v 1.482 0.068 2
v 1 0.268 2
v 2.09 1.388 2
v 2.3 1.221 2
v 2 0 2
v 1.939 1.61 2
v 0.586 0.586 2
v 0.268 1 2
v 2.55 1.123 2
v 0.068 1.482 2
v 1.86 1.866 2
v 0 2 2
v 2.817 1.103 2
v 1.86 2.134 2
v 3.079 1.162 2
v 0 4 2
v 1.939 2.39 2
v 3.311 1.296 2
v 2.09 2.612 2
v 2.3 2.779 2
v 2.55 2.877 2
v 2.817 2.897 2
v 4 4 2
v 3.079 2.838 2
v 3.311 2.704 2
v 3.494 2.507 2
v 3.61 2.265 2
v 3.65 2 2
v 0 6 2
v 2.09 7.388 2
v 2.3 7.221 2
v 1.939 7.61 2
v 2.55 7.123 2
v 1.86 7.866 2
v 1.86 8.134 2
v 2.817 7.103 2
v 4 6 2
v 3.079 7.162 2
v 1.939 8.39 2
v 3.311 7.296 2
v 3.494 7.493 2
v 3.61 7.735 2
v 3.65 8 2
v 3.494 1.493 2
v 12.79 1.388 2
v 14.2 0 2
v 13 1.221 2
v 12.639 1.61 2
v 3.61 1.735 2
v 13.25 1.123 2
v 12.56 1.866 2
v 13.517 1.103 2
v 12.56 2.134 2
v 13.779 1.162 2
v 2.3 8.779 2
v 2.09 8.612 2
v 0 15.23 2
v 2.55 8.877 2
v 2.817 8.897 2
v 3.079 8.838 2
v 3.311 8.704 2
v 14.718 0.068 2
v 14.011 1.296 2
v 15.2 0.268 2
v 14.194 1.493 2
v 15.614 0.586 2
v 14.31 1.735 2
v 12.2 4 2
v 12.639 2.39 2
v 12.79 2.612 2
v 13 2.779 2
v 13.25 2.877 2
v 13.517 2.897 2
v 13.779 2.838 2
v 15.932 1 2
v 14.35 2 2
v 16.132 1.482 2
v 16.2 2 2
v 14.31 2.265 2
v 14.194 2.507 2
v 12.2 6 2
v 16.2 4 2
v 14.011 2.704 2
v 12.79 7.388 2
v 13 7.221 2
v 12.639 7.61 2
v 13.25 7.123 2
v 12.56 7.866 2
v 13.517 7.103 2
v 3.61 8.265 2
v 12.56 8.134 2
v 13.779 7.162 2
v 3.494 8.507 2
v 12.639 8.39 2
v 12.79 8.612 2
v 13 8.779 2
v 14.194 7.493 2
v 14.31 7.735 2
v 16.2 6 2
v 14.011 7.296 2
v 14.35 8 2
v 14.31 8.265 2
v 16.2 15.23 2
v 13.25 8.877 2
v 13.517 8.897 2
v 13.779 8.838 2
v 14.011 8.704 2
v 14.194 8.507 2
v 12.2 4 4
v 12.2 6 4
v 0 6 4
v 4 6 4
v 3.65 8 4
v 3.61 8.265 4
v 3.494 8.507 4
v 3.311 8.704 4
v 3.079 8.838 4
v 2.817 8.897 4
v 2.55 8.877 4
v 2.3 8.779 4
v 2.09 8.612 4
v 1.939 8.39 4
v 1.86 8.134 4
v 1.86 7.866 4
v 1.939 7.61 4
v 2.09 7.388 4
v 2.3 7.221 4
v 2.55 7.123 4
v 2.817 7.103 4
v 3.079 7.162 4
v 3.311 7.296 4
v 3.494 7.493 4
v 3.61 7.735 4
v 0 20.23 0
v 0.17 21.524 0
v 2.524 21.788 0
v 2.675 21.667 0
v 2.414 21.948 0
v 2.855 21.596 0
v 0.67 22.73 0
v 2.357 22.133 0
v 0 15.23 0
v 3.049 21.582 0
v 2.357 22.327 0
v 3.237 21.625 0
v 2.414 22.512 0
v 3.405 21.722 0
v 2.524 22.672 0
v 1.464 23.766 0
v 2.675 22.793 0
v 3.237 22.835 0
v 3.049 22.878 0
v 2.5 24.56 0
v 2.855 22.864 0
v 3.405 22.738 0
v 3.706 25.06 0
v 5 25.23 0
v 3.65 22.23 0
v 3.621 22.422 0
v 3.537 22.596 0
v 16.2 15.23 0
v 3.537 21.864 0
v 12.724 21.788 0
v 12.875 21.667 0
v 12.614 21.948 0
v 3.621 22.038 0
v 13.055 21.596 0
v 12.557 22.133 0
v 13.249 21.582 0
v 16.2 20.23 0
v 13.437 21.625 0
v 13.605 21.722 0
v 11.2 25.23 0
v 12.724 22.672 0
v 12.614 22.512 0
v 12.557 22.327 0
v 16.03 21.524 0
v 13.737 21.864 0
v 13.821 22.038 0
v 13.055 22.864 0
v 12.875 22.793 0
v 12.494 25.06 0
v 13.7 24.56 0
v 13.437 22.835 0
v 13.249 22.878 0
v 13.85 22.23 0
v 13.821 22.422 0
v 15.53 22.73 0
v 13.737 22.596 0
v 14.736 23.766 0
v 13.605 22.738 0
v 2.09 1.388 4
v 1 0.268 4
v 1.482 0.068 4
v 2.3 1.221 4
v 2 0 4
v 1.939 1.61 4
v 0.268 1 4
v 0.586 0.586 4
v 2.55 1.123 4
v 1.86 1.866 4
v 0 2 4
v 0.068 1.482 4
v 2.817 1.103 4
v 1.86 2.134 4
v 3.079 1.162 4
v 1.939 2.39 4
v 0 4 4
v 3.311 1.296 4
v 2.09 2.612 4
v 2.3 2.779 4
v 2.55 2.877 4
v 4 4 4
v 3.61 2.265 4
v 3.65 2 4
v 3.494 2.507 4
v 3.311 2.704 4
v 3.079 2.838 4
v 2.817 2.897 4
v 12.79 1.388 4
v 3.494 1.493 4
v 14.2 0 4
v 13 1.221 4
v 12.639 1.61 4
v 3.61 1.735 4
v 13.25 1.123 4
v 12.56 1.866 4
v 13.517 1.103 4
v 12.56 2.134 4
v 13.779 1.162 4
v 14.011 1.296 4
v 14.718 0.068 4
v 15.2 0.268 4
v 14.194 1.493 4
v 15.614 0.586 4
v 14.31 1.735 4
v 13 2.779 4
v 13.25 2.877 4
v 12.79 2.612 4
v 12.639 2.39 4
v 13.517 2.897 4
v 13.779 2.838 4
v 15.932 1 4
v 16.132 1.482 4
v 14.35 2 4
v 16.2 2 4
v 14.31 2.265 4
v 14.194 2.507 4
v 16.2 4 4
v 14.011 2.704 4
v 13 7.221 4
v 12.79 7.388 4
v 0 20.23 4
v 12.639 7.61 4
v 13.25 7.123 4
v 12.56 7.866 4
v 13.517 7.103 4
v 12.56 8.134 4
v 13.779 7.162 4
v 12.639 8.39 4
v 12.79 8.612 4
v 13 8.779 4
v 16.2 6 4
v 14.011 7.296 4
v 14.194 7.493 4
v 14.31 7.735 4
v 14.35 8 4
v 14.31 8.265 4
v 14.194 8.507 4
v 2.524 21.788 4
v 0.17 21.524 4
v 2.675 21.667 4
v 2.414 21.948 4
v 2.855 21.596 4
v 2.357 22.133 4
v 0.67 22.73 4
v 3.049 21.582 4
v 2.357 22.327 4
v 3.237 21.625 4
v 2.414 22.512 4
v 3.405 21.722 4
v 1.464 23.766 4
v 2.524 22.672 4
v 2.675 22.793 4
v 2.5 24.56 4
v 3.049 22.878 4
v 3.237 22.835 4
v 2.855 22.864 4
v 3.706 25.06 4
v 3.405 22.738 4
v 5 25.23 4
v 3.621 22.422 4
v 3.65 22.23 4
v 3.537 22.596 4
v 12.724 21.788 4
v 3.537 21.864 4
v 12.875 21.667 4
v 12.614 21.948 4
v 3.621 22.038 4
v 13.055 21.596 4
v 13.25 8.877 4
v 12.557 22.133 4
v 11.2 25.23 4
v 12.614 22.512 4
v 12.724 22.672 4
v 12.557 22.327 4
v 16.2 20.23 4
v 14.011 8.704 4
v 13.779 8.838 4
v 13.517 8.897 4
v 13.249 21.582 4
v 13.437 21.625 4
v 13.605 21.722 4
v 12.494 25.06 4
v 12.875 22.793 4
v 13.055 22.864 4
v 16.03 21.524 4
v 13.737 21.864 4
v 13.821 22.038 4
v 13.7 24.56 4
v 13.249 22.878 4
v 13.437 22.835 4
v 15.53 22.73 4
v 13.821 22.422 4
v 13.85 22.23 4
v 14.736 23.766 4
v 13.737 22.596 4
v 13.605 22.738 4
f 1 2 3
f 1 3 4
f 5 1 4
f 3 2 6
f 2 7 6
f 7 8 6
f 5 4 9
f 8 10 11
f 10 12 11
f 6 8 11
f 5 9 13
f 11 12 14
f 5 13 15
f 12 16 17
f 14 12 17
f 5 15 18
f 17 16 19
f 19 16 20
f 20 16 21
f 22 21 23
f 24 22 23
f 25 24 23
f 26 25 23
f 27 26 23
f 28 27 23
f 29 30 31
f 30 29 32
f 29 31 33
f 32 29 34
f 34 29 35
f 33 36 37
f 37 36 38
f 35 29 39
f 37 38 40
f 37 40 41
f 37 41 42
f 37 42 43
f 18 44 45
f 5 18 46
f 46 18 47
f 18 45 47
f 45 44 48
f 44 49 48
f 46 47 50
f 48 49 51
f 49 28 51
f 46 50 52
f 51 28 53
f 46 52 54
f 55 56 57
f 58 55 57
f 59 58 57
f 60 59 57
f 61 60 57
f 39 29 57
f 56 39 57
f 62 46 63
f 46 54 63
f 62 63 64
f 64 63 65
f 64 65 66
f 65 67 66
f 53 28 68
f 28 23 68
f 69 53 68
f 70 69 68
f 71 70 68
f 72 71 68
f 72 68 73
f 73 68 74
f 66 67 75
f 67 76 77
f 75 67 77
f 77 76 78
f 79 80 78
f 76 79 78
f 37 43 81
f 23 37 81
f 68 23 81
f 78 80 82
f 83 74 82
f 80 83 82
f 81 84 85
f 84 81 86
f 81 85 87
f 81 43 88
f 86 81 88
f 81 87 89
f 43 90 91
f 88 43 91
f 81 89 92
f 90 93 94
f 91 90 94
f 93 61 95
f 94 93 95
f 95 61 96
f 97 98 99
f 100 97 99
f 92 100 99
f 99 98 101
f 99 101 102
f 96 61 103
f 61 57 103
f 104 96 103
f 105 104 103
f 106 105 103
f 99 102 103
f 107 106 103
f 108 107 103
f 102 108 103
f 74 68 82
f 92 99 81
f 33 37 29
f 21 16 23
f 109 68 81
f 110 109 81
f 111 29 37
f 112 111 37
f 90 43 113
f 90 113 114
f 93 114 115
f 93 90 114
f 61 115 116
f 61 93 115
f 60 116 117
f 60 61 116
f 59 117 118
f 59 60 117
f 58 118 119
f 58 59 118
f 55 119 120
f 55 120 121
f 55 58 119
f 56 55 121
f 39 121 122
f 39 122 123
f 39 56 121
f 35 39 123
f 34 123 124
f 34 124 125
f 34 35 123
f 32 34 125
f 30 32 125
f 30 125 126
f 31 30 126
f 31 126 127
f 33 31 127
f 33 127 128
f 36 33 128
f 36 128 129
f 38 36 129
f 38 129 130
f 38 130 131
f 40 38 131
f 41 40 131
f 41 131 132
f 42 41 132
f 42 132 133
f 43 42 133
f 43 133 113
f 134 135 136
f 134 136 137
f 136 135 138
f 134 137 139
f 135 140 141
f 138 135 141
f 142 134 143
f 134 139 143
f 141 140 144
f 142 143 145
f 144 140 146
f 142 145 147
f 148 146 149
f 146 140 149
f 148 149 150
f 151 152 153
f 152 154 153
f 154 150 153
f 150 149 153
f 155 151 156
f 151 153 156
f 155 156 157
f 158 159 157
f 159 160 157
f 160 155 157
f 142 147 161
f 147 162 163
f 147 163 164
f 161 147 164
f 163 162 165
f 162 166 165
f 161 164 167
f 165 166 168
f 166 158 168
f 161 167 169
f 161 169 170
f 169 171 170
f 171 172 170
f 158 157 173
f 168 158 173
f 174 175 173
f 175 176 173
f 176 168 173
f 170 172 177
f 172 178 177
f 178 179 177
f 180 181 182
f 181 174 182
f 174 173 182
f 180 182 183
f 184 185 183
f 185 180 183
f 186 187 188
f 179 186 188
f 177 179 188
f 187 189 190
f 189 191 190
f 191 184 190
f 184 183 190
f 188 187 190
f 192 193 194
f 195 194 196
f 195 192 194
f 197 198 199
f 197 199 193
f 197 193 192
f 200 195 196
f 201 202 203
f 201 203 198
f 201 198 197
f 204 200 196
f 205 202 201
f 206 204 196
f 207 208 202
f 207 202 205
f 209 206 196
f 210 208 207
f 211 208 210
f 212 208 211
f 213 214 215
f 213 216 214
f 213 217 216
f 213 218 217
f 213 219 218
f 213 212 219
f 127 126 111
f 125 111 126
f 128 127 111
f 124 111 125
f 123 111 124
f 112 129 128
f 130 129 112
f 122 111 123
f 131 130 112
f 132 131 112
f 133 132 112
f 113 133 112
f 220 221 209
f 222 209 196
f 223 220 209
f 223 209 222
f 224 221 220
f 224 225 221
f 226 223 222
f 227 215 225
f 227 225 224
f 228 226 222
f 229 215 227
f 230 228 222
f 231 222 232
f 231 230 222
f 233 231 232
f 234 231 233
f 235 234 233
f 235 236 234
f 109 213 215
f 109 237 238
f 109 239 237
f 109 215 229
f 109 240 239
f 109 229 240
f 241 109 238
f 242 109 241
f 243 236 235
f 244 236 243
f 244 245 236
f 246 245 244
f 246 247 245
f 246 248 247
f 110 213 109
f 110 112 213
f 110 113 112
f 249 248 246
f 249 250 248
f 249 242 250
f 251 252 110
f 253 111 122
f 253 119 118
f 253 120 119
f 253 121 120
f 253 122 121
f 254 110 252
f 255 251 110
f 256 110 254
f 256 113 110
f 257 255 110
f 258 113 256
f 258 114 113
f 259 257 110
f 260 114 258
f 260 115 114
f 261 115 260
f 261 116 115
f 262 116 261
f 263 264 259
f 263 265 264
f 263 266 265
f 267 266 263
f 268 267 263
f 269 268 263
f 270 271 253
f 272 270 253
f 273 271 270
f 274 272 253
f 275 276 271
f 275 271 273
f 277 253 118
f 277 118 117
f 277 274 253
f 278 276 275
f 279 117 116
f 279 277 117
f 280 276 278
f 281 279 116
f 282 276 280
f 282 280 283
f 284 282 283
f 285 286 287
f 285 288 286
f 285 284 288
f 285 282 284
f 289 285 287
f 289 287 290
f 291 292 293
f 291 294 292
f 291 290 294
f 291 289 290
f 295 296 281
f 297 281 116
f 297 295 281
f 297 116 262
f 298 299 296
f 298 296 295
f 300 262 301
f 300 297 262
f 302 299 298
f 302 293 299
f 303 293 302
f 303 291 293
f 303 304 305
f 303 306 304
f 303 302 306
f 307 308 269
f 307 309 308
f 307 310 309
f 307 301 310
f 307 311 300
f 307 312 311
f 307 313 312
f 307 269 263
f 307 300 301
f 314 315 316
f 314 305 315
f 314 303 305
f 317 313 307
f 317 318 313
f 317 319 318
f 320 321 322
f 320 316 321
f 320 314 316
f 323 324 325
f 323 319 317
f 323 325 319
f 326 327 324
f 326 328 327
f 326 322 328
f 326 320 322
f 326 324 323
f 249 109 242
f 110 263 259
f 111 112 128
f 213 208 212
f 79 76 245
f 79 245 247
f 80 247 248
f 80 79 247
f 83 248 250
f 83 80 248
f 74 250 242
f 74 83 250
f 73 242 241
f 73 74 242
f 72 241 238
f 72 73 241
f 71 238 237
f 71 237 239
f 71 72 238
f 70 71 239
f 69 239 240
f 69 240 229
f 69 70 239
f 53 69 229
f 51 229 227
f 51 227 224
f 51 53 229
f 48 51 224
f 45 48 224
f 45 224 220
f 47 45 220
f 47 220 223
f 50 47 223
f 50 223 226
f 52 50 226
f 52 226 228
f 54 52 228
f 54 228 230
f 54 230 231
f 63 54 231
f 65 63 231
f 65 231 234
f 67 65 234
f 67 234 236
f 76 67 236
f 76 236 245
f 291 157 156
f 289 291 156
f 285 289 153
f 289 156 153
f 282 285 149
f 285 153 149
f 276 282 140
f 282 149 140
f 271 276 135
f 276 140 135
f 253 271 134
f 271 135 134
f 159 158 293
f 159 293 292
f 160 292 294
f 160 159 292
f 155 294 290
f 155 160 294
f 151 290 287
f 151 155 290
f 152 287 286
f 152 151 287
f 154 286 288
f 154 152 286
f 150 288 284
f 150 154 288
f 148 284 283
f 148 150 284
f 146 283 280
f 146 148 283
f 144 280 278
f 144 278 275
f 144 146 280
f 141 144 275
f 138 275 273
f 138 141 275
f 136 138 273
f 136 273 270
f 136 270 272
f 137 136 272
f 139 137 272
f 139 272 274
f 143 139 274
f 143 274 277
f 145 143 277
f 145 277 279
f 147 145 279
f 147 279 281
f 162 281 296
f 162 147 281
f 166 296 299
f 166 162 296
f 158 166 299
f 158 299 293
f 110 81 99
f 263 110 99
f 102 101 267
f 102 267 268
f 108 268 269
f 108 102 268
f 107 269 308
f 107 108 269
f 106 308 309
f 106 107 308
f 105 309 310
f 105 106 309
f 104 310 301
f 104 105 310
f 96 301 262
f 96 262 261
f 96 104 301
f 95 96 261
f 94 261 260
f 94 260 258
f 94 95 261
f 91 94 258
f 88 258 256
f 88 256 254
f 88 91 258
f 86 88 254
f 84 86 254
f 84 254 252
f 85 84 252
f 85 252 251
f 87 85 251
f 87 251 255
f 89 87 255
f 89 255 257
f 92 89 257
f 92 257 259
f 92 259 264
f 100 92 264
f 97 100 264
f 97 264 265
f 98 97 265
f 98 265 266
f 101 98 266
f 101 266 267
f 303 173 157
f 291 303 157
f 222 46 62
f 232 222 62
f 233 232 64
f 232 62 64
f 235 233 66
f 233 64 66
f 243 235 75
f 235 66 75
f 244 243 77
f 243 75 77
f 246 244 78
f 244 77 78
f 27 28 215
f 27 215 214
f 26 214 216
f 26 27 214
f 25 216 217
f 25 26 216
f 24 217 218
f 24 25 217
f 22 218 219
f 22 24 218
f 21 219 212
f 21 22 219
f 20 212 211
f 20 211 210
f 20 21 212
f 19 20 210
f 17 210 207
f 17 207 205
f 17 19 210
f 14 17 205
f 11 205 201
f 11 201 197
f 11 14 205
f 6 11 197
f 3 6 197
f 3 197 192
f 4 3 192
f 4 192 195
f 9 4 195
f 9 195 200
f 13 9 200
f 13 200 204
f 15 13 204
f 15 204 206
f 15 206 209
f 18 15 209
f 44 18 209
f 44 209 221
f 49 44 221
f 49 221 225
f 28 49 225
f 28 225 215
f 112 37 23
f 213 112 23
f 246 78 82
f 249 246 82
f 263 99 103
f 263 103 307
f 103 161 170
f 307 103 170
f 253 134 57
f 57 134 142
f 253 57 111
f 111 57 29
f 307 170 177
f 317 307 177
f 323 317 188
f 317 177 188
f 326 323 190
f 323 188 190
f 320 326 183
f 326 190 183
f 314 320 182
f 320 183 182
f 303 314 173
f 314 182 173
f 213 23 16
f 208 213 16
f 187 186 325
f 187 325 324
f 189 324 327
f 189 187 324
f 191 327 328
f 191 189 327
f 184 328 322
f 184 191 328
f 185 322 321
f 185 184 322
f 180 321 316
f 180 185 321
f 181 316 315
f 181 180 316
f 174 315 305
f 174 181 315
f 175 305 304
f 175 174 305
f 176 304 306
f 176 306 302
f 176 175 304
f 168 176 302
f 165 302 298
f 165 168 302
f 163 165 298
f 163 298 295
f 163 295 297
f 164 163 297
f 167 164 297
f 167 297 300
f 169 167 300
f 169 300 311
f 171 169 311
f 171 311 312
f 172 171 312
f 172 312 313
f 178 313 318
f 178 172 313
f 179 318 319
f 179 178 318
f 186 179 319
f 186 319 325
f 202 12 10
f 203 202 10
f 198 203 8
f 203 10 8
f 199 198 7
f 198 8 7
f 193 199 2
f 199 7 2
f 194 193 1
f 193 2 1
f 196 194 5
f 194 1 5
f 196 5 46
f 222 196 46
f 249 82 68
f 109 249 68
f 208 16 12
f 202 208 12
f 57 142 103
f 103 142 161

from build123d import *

# Parameters (mm, degrees)
SKETCH1_R           = 0.9
SKETCH1_R_2         = 0.65
BOSS_EXTRUDE1_DEPTH = 4
SKETCH2_W           = 16.2
SKETCH2_H           = 15.23
CUT_EXTRUDE1_DEPTH  = 2


with BuildPart() as part:
    # Sketch1 → Boss-Extrude1 (new body)
    with BuildSketch(Plane.XY):
        with BuildLine():
            Line((2, 0), (14.2, 0))
            ThreePointArc((14.2, 0), (15.614213562, 0.585786438), (16.2, 2))
            Line((16.2, 2), (16.2, 4))
            Line((16.2, 4), (12.2, 4))
            Line((12.2, 4), (12.2, 6))
            Line((12.2, 6), (16.2, 6))
            Line((16.2, 6), (16.2, 20.23))
            ThreePointArc((16.2, 20.23), (14.735533906, 23.765533906), (11.2, 25.23))
            Line((11.2, 25.23), (5, 25.23))
            ThreePointArc((5, 25.23), (1.464466094, 23.765533906), (0, 20.23))
            Line((0, 20.23), (0, 6))
            Line((0, 6), (4, 6))
            Line((4, 6), (4, 4))
            Line((4, 4), (0, 4))
            Line((0, 4), (0, 2))
            ThreePointArc((0, 2), (0.585786438, 0.585786438), (2, 0))
        make_face()
        with Locations((13.45, 2)):
            Circle(SKETCH1_R, mode=Mode.SUBTRACT)
        with Locations((13.2, 22.23)):
            Circle(SKETCH1_R_2, mode=Mode.SUBTRACT)
        with Locations((2.75, 8)):
            Circle(SKETCH1_R, mode=Mode.SUBTRACT)
        with Locations((13.45, 8)):
            Circle(SKETCH1_R, mode=Mode.SUBTRACT)
        with Locations((3, 22.23)):
            Circle(SKETCH1_R_2, mode=Mode.SUBTRACT)
        with Locations((2.75, 2)):
            Circle(SKETCH1_R, mode=Mode.SUBTRACT)
    extrude(amount=BOSS_EXTRUDE1_DEPTH)

    # Sketch2 → Cut-Extrude1 (cut)
    with BuildSketch(Plane.XY):
        with Locations((8.1, 7.615)):
            Rectangle(SKETCH2_W, SKETCH2_H)
    extrude(amount=CUT_EXTRUDE1_DEPTH, mode=Mode.SUBTRACT)


solid = part.part
